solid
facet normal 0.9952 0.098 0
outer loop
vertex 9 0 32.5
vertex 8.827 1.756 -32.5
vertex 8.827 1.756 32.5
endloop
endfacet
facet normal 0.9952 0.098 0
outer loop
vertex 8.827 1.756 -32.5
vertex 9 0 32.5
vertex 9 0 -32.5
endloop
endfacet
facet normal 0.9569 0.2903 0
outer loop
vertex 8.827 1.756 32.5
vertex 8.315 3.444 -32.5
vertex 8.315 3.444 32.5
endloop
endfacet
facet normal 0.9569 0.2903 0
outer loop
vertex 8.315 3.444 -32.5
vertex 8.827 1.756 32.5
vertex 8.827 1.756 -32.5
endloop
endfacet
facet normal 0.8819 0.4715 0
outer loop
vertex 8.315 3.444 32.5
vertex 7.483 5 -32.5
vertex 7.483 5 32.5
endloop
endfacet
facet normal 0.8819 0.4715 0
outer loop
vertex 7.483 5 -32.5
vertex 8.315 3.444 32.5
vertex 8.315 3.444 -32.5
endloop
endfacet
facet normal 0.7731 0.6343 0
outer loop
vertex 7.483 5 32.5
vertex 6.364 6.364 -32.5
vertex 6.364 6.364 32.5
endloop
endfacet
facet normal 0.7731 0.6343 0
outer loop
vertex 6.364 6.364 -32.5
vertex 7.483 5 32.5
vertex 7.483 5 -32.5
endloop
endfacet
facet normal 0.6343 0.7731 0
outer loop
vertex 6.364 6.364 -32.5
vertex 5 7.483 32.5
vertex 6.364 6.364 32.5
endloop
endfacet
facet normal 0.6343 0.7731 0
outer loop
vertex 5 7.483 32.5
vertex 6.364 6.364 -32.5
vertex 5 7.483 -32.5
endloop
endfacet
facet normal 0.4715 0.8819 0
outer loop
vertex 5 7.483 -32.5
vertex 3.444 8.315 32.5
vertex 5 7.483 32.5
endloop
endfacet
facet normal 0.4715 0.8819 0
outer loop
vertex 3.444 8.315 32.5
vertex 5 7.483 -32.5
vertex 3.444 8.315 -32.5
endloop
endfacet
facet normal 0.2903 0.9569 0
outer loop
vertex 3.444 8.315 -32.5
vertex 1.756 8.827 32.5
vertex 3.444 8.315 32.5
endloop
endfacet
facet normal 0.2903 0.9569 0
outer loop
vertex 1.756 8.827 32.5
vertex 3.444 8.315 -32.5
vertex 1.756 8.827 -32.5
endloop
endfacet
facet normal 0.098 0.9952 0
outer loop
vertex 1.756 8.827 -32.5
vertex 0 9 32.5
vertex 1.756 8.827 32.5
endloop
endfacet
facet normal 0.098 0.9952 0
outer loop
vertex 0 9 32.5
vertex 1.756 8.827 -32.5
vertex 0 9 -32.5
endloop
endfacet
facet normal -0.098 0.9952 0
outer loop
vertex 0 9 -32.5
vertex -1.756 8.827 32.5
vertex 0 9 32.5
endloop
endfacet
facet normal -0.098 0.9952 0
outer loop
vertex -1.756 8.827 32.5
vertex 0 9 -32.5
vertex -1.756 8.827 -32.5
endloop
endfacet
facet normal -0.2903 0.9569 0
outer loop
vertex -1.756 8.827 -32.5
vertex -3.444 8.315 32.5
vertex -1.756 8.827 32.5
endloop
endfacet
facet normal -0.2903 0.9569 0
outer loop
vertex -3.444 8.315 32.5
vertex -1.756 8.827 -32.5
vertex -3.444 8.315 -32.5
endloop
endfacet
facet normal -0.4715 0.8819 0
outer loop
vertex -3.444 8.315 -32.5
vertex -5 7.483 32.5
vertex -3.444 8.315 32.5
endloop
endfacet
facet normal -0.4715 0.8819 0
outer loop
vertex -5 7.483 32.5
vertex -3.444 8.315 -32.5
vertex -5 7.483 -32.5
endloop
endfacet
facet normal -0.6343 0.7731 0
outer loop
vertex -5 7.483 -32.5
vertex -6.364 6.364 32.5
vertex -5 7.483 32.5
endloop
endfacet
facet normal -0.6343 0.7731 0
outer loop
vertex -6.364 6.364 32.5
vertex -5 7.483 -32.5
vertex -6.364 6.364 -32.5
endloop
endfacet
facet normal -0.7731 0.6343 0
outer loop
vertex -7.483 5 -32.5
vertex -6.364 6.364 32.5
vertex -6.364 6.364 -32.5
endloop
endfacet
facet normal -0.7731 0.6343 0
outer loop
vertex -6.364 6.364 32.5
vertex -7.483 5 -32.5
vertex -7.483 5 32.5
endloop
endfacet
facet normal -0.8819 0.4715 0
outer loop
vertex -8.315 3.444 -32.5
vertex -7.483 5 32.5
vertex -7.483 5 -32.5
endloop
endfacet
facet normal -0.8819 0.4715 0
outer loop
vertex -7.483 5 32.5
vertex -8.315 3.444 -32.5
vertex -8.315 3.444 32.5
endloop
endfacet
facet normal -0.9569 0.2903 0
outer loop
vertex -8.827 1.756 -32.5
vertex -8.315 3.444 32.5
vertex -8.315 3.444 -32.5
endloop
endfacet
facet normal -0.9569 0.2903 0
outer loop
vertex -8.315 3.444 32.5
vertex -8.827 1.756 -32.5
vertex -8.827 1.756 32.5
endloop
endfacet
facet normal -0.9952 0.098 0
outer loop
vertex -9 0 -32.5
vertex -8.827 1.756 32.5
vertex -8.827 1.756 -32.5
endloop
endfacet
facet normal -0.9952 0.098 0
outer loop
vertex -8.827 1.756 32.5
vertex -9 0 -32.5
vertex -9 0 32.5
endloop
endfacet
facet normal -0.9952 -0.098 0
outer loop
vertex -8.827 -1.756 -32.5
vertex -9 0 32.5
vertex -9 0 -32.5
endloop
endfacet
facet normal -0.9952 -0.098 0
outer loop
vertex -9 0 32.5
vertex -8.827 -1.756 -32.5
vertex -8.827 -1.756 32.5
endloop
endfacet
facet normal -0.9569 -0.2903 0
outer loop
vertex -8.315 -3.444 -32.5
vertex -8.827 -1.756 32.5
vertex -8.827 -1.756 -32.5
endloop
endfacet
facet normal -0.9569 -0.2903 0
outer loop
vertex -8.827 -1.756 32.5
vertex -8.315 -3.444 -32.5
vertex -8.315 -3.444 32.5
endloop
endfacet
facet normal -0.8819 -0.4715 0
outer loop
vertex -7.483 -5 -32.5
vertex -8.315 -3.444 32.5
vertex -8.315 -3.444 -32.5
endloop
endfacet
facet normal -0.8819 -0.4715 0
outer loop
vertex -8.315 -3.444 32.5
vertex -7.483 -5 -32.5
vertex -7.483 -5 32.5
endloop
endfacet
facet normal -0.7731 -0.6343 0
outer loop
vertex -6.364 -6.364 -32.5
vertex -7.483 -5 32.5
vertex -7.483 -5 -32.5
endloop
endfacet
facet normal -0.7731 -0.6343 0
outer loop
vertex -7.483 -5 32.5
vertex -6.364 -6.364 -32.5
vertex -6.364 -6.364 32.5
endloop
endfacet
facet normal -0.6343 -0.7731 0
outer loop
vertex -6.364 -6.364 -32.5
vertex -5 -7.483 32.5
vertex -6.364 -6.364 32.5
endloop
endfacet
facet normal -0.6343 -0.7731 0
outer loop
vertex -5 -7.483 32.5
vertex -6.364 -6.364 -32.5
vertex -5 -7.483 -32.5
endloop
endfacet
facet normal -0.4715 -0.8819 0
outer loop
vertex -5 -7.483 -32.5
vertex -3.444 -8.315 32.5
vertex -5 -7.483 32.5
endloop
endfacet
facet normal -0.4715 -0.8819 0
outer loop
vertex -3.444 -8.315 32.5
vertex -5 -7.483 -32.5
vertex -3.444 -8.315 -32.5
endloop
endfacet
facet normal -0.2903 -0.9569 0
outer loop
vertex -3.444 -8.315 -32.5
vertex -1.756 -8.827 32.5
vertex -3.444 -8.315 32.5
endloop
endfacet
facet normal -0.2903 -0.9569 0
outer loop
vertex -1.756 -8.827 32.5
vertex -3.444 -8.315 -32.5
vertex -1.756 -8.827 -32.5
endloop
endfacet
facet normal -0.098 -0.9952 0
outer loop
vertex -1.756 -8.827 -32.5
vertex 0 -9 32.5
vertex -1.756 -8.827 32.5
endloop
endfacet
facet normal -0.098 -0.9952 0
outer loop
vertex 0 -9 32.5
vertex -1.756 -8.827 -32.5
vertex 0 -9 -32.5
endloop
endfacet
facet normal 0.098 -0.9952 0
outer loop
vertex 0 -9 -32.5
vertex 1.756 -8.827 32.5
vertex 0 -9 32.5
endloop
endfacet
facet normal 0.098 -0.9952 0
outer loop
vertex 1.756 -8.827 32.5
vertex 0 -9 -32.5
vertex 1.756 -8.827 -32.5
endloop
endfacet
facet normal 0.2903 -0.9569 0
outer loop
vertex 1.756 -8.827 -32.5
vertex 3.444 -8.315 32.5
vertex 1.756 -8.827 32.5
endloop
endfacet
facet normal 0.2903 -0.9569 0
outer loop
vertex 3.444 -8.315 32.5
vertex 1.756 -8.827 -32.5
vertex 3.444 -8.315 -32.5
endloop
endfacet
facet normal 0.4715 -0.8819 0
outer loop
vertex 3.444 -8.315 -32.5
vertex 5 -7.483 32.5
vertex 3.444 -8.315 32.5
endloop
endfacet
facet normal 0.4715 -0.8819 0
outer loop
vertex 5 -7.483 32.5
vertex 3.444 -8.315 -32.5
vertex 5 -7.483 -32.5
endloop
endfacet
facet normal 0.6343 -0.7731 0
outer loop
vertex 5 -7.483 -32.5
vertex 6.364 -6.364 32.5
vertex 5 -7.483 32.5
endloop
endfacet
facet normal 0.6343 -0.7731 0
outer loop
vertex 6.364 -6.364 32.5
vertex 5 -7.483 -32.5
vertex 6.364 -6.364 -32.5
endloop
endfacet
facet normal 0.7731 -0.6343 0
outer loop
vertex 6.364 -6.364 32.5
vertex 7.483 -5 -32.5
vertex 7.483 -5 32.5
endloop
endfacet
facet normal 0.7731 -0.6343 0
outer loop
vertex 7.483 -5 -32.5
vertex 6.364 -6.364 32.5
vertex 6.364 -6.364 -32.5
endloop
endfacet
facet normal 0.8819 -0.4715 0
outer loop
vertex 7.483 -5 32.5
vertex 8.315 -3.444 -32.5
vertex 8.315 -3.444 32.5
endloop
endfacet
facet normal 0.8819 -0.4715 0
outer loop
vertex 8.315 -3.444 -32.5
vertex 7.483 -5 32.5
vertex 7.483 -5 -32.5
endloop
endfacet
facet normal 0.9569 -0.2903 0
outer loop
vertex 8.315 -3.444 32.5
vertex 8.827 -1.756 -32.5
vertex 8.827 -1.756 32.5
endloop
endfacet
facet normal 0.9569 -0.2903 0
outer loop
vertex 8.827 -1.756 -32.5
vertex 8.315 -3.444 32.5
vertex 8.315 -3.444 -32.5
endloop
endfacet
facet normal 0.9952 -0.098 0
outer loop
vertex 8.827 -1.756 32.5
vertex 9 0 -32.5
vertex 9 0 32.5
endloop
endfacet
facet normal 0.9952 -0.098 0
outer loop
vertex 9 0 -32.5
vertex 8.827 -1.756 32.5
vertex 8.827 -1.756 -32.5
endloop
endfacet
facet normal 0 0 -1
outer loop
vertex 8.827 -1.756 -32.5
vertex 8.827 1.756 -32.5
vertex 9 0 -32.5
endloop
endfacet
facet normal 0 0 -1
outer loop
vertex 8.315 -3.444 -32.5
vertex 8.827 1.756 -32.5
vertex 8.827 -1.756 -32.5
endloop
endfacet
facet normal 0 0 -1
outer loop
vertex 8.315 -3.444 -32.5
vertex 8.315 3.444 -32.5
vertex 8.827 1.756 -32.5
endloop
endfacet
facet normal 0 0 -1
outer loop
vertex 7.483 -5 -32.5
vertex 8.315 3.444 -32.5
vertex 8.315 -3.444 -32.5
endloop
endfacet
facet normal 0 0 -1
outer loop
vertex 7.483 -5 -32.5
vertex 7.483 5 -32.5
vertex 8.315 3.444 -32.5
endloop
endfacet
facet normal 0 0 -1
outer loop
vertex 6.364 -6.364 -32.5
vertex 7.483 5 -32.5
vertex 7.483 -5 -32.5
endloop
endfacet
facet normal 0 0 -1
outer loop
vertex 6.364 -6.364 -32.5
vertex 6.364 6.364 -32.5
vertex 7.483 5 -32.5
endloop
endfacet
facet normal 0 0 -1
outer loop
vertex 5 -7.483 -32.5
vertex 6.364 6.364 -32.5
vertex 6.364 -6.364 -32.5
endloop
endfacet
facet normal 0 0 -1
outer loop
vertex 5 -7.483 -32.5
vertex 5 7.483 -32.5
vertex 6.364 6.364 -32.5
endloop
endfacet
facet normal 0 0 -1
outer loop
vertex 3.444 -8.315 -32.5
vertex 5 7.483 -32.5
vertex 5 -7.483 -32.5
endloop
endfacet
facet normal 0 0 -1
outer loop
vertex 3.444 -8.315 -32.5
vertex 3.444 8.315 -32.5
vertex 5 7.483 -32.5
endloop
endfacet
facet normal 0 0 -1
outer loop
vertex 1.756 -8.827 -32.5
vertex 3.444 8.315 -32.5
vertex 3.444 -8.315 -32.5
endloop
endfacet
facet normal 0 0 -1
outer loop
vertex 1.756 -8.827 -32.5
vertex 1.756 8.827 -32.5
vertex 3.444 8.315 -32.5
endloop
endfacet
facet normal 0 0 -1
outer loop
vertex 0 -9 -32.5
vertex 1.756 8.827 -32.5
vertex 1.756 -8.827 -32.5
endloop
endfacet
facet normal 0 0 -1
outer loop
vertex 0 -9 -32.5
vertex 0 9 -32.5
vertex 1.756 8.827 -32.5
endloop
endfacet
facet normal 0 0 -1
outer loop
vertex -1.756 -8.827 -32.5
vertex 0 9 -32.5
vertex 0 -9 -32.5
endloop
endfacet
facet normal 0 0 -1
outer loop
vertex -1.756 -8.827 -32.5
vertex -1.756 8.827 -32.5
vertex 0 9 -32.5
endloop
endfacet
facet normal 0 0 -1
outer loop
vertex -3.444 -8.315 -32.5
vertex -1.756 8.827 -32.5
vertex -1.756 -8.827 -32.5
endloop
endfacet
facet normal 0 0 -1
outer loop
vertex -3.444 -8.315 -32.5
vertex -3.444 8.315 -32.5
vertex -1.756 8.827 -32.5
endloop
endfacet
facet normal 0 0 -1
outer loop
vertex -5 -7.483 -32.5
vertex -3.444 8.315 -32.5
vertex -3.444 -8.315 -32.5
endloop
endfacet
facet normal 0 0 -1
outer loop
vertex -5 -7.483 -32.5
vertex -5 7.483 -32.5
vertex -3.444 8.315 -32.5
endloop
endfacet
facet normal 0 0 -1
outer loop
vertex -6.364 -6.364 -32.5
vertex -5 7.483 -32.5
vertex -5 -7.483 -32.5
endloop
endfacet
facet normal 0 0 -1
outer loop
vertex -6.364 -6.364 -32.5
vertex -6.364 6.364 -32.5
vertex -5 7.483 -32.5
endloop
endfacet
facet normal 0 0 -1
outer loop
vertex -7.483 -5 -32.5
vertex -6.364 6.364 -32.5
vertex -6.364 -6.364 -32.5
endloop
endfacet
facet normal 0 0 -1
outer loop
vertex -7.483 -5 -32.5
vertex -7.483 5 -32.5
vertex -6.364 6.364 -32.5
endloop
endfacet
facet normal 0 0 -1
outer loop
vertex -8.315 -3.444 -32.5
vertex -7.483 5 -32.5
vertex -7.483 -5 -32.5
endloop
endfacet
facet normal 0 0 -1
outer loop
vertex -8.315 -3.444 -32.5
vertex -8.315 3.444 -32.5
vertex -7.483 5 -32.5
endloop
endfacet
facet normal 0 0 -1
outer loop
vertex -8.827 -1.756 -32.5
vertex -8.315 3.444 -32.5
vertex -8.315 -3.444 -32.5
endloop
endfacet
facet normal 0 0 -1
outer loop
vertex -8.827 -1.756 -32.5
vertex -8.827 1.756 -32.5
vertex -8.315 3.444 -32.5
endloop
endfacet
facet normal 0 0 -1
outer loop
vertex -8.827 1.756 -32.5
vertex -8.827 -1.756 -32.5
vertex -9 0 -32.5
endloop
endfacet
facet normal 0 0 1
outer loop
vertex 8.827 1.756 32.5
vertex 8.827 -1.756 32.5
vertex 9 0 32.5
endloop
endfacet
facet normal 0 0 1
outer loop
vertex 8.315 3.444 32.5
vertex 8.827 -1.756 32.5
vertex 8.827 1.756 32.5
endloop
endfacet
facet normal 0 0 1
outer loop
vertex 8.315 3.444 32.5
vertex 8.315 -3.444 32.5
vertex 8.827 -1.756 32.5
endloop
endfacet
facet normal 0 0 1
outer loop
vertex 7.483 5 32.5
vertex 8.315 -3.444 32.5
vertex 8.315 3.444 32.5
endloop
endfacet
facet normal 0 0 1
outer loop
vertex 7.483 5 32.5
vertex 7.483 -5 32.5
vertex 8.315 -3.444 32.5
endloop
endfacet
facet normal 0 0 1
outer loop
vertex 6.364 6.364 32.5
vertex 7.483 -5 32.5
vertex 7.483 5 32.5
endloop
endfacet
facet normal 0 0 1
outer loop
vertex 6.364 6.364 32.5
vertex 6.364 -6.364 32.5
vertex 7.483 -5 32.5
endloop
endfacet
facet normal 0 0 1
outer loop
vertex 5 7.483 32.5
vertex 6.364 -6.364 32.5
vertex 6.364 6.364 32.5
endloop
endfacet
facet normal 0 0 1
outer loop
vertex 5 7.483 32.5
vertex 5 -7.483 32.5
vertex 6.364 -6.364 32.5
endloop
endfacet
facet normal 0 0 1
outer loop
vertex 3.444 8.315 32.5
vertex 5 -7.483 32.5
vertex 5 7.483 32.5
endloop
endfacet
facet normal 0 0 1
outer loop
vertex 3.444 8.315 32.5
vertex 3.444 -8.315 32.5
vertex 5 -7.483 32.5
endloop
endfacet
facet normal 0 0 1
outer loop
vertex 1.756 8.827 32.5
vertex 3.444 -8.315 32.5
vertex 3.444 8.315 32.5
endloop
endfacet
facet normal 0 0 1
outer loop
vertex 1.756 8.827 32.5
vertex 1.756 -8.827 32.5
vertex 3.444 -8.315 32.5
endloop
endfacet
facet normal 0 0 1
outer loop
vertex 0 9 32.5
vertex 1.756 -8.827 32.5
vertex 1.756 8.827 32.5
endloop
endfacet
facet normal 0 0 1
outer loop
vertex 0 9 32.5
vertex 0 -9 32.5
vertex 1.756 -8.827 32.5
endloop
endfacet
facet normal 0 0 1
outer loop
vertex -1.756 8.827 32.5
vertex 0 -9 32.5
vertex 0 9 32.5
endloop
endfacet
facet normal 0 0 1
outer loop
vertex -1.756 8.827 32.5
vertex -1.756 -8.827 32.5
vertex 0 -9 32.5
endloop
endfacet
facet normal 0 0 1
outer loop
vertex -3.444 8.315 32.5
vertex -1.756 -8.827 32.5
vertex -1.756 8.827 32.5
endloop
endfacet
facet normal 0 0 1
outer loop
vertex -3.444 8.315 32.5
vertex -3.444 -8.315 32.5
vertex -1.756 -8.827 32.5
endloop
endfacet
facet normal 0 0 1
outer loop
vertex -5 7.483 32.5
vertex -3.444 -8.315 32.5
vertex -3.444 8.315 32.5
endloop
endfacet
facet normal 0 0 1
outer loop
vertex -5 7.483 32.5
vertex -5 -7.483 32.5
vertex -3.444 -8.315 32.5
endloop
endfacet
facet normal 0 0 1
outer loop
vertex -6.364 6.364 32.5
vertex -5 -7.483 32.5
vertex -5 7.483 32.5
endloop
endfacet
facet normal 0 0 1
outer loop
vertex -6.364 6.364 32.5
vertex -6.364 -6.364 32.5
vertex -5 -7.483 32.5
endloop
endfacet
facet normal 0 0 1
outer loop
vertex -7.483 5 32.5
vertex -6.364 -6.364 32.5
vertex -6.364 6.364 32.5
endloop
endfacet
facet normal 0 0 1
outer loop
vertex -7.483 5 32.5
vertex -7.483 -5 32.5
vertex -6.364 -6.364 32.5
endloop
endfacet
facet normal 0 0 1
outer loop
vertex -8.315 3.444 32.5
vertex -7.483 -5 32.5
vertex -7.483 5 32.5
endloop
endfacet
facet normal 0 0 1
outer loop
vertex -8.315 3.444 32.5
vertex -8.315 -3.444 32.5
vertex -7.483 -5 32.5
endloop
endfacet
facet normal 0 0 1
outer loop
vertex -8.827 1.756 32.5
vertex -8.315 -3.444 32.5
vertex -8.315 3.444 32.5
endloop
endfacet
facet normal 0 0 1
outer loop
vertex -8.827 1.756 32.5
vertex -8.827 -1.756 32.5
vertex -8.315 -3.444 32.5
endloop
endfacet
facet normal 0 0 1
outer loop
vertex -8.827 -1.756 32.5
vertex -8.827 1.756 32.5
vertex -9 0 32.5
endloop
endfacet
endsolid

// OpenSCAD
echo("Работа Полина Максимова");
d_akkum = 18;
h_akkum = 65;
akkum18650();

module akkum18650(){
    color("purple")
    cylinder(d=18,h=65, $fn=32, center=true);
}
